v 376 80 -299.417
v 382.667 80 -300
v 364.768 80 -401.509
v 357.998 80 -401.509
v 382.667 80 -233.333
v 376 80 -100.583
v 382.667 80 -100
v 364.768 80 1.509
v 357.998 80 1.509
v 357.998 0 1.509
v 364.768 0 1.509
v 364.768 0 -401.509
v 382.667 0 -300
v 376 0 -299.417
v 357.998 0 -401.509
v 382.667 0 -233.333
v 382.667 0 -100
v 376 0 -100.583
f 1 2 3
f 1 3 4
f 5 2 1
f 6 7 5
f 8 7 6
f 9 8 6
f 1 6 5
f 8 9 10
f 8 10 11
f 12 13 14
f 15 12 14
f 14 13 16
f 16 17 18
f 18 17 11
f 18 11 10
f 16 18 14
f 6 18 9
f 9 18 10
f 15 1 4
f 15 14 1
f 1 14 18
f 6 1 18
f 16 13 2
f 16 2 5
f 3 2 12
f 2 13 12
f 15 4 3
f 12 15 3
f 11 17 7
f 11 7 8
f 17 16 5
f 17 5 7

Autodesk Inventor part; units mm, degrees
ref_plane "YZ Plane" through (0, 0, 0) normal (1, 0, 0) x (0, 1, 0)
ref_plane "XZ Plane" through (0, 0, 0) normal (0, 1, 0) x (-1, 0, 0)
ref_plane "XY Plane" through (0, 0, 0) normal (0, 0, 1) x (1, 0, 0)
sketch "Boceto1" plane through (0, 0, 0) normal (0, 1, 0) x (-1, 0, 0)
  line L0 (-382.6667, -300) -> (-382.6667, -100)
  line L1 (-382.6667, -300) -> (-382.6667, -233.3333)
  line L2 (-382.6667, -233.3333) -> (-382.6667, -300)
  line L3 (-382.6667, -300) -> (-364.7679, -401.509)
  line L4 (-382.6667, -300) -> (-382.6667, -100)
  line L5 (-382.6667, -100) -> (-364.7679, 1.509)
  line L6 (-376, -300) -> (-376, -100)
  line L7 (-376.1013, -298.8423) -> (-357.9984, -401.509)
  line L8 (-376.1013, -101.1577) -> (-357.9984, 1.509)
  line L9 (-357.9984, 1.509) -> (-364.7679, 1.509)
  line L10 (-357.9984, -401.509) -> (-364.7679, -401.509)
  point P0 (0, 0)
  point P1 (-376, -299.4167)
  point P2 (-376, -100.5833)
  dimension "d14" = 200
extrude "Extrusión1" add sketch "Boceto1" along normal blind 80
properties part number "guia"
